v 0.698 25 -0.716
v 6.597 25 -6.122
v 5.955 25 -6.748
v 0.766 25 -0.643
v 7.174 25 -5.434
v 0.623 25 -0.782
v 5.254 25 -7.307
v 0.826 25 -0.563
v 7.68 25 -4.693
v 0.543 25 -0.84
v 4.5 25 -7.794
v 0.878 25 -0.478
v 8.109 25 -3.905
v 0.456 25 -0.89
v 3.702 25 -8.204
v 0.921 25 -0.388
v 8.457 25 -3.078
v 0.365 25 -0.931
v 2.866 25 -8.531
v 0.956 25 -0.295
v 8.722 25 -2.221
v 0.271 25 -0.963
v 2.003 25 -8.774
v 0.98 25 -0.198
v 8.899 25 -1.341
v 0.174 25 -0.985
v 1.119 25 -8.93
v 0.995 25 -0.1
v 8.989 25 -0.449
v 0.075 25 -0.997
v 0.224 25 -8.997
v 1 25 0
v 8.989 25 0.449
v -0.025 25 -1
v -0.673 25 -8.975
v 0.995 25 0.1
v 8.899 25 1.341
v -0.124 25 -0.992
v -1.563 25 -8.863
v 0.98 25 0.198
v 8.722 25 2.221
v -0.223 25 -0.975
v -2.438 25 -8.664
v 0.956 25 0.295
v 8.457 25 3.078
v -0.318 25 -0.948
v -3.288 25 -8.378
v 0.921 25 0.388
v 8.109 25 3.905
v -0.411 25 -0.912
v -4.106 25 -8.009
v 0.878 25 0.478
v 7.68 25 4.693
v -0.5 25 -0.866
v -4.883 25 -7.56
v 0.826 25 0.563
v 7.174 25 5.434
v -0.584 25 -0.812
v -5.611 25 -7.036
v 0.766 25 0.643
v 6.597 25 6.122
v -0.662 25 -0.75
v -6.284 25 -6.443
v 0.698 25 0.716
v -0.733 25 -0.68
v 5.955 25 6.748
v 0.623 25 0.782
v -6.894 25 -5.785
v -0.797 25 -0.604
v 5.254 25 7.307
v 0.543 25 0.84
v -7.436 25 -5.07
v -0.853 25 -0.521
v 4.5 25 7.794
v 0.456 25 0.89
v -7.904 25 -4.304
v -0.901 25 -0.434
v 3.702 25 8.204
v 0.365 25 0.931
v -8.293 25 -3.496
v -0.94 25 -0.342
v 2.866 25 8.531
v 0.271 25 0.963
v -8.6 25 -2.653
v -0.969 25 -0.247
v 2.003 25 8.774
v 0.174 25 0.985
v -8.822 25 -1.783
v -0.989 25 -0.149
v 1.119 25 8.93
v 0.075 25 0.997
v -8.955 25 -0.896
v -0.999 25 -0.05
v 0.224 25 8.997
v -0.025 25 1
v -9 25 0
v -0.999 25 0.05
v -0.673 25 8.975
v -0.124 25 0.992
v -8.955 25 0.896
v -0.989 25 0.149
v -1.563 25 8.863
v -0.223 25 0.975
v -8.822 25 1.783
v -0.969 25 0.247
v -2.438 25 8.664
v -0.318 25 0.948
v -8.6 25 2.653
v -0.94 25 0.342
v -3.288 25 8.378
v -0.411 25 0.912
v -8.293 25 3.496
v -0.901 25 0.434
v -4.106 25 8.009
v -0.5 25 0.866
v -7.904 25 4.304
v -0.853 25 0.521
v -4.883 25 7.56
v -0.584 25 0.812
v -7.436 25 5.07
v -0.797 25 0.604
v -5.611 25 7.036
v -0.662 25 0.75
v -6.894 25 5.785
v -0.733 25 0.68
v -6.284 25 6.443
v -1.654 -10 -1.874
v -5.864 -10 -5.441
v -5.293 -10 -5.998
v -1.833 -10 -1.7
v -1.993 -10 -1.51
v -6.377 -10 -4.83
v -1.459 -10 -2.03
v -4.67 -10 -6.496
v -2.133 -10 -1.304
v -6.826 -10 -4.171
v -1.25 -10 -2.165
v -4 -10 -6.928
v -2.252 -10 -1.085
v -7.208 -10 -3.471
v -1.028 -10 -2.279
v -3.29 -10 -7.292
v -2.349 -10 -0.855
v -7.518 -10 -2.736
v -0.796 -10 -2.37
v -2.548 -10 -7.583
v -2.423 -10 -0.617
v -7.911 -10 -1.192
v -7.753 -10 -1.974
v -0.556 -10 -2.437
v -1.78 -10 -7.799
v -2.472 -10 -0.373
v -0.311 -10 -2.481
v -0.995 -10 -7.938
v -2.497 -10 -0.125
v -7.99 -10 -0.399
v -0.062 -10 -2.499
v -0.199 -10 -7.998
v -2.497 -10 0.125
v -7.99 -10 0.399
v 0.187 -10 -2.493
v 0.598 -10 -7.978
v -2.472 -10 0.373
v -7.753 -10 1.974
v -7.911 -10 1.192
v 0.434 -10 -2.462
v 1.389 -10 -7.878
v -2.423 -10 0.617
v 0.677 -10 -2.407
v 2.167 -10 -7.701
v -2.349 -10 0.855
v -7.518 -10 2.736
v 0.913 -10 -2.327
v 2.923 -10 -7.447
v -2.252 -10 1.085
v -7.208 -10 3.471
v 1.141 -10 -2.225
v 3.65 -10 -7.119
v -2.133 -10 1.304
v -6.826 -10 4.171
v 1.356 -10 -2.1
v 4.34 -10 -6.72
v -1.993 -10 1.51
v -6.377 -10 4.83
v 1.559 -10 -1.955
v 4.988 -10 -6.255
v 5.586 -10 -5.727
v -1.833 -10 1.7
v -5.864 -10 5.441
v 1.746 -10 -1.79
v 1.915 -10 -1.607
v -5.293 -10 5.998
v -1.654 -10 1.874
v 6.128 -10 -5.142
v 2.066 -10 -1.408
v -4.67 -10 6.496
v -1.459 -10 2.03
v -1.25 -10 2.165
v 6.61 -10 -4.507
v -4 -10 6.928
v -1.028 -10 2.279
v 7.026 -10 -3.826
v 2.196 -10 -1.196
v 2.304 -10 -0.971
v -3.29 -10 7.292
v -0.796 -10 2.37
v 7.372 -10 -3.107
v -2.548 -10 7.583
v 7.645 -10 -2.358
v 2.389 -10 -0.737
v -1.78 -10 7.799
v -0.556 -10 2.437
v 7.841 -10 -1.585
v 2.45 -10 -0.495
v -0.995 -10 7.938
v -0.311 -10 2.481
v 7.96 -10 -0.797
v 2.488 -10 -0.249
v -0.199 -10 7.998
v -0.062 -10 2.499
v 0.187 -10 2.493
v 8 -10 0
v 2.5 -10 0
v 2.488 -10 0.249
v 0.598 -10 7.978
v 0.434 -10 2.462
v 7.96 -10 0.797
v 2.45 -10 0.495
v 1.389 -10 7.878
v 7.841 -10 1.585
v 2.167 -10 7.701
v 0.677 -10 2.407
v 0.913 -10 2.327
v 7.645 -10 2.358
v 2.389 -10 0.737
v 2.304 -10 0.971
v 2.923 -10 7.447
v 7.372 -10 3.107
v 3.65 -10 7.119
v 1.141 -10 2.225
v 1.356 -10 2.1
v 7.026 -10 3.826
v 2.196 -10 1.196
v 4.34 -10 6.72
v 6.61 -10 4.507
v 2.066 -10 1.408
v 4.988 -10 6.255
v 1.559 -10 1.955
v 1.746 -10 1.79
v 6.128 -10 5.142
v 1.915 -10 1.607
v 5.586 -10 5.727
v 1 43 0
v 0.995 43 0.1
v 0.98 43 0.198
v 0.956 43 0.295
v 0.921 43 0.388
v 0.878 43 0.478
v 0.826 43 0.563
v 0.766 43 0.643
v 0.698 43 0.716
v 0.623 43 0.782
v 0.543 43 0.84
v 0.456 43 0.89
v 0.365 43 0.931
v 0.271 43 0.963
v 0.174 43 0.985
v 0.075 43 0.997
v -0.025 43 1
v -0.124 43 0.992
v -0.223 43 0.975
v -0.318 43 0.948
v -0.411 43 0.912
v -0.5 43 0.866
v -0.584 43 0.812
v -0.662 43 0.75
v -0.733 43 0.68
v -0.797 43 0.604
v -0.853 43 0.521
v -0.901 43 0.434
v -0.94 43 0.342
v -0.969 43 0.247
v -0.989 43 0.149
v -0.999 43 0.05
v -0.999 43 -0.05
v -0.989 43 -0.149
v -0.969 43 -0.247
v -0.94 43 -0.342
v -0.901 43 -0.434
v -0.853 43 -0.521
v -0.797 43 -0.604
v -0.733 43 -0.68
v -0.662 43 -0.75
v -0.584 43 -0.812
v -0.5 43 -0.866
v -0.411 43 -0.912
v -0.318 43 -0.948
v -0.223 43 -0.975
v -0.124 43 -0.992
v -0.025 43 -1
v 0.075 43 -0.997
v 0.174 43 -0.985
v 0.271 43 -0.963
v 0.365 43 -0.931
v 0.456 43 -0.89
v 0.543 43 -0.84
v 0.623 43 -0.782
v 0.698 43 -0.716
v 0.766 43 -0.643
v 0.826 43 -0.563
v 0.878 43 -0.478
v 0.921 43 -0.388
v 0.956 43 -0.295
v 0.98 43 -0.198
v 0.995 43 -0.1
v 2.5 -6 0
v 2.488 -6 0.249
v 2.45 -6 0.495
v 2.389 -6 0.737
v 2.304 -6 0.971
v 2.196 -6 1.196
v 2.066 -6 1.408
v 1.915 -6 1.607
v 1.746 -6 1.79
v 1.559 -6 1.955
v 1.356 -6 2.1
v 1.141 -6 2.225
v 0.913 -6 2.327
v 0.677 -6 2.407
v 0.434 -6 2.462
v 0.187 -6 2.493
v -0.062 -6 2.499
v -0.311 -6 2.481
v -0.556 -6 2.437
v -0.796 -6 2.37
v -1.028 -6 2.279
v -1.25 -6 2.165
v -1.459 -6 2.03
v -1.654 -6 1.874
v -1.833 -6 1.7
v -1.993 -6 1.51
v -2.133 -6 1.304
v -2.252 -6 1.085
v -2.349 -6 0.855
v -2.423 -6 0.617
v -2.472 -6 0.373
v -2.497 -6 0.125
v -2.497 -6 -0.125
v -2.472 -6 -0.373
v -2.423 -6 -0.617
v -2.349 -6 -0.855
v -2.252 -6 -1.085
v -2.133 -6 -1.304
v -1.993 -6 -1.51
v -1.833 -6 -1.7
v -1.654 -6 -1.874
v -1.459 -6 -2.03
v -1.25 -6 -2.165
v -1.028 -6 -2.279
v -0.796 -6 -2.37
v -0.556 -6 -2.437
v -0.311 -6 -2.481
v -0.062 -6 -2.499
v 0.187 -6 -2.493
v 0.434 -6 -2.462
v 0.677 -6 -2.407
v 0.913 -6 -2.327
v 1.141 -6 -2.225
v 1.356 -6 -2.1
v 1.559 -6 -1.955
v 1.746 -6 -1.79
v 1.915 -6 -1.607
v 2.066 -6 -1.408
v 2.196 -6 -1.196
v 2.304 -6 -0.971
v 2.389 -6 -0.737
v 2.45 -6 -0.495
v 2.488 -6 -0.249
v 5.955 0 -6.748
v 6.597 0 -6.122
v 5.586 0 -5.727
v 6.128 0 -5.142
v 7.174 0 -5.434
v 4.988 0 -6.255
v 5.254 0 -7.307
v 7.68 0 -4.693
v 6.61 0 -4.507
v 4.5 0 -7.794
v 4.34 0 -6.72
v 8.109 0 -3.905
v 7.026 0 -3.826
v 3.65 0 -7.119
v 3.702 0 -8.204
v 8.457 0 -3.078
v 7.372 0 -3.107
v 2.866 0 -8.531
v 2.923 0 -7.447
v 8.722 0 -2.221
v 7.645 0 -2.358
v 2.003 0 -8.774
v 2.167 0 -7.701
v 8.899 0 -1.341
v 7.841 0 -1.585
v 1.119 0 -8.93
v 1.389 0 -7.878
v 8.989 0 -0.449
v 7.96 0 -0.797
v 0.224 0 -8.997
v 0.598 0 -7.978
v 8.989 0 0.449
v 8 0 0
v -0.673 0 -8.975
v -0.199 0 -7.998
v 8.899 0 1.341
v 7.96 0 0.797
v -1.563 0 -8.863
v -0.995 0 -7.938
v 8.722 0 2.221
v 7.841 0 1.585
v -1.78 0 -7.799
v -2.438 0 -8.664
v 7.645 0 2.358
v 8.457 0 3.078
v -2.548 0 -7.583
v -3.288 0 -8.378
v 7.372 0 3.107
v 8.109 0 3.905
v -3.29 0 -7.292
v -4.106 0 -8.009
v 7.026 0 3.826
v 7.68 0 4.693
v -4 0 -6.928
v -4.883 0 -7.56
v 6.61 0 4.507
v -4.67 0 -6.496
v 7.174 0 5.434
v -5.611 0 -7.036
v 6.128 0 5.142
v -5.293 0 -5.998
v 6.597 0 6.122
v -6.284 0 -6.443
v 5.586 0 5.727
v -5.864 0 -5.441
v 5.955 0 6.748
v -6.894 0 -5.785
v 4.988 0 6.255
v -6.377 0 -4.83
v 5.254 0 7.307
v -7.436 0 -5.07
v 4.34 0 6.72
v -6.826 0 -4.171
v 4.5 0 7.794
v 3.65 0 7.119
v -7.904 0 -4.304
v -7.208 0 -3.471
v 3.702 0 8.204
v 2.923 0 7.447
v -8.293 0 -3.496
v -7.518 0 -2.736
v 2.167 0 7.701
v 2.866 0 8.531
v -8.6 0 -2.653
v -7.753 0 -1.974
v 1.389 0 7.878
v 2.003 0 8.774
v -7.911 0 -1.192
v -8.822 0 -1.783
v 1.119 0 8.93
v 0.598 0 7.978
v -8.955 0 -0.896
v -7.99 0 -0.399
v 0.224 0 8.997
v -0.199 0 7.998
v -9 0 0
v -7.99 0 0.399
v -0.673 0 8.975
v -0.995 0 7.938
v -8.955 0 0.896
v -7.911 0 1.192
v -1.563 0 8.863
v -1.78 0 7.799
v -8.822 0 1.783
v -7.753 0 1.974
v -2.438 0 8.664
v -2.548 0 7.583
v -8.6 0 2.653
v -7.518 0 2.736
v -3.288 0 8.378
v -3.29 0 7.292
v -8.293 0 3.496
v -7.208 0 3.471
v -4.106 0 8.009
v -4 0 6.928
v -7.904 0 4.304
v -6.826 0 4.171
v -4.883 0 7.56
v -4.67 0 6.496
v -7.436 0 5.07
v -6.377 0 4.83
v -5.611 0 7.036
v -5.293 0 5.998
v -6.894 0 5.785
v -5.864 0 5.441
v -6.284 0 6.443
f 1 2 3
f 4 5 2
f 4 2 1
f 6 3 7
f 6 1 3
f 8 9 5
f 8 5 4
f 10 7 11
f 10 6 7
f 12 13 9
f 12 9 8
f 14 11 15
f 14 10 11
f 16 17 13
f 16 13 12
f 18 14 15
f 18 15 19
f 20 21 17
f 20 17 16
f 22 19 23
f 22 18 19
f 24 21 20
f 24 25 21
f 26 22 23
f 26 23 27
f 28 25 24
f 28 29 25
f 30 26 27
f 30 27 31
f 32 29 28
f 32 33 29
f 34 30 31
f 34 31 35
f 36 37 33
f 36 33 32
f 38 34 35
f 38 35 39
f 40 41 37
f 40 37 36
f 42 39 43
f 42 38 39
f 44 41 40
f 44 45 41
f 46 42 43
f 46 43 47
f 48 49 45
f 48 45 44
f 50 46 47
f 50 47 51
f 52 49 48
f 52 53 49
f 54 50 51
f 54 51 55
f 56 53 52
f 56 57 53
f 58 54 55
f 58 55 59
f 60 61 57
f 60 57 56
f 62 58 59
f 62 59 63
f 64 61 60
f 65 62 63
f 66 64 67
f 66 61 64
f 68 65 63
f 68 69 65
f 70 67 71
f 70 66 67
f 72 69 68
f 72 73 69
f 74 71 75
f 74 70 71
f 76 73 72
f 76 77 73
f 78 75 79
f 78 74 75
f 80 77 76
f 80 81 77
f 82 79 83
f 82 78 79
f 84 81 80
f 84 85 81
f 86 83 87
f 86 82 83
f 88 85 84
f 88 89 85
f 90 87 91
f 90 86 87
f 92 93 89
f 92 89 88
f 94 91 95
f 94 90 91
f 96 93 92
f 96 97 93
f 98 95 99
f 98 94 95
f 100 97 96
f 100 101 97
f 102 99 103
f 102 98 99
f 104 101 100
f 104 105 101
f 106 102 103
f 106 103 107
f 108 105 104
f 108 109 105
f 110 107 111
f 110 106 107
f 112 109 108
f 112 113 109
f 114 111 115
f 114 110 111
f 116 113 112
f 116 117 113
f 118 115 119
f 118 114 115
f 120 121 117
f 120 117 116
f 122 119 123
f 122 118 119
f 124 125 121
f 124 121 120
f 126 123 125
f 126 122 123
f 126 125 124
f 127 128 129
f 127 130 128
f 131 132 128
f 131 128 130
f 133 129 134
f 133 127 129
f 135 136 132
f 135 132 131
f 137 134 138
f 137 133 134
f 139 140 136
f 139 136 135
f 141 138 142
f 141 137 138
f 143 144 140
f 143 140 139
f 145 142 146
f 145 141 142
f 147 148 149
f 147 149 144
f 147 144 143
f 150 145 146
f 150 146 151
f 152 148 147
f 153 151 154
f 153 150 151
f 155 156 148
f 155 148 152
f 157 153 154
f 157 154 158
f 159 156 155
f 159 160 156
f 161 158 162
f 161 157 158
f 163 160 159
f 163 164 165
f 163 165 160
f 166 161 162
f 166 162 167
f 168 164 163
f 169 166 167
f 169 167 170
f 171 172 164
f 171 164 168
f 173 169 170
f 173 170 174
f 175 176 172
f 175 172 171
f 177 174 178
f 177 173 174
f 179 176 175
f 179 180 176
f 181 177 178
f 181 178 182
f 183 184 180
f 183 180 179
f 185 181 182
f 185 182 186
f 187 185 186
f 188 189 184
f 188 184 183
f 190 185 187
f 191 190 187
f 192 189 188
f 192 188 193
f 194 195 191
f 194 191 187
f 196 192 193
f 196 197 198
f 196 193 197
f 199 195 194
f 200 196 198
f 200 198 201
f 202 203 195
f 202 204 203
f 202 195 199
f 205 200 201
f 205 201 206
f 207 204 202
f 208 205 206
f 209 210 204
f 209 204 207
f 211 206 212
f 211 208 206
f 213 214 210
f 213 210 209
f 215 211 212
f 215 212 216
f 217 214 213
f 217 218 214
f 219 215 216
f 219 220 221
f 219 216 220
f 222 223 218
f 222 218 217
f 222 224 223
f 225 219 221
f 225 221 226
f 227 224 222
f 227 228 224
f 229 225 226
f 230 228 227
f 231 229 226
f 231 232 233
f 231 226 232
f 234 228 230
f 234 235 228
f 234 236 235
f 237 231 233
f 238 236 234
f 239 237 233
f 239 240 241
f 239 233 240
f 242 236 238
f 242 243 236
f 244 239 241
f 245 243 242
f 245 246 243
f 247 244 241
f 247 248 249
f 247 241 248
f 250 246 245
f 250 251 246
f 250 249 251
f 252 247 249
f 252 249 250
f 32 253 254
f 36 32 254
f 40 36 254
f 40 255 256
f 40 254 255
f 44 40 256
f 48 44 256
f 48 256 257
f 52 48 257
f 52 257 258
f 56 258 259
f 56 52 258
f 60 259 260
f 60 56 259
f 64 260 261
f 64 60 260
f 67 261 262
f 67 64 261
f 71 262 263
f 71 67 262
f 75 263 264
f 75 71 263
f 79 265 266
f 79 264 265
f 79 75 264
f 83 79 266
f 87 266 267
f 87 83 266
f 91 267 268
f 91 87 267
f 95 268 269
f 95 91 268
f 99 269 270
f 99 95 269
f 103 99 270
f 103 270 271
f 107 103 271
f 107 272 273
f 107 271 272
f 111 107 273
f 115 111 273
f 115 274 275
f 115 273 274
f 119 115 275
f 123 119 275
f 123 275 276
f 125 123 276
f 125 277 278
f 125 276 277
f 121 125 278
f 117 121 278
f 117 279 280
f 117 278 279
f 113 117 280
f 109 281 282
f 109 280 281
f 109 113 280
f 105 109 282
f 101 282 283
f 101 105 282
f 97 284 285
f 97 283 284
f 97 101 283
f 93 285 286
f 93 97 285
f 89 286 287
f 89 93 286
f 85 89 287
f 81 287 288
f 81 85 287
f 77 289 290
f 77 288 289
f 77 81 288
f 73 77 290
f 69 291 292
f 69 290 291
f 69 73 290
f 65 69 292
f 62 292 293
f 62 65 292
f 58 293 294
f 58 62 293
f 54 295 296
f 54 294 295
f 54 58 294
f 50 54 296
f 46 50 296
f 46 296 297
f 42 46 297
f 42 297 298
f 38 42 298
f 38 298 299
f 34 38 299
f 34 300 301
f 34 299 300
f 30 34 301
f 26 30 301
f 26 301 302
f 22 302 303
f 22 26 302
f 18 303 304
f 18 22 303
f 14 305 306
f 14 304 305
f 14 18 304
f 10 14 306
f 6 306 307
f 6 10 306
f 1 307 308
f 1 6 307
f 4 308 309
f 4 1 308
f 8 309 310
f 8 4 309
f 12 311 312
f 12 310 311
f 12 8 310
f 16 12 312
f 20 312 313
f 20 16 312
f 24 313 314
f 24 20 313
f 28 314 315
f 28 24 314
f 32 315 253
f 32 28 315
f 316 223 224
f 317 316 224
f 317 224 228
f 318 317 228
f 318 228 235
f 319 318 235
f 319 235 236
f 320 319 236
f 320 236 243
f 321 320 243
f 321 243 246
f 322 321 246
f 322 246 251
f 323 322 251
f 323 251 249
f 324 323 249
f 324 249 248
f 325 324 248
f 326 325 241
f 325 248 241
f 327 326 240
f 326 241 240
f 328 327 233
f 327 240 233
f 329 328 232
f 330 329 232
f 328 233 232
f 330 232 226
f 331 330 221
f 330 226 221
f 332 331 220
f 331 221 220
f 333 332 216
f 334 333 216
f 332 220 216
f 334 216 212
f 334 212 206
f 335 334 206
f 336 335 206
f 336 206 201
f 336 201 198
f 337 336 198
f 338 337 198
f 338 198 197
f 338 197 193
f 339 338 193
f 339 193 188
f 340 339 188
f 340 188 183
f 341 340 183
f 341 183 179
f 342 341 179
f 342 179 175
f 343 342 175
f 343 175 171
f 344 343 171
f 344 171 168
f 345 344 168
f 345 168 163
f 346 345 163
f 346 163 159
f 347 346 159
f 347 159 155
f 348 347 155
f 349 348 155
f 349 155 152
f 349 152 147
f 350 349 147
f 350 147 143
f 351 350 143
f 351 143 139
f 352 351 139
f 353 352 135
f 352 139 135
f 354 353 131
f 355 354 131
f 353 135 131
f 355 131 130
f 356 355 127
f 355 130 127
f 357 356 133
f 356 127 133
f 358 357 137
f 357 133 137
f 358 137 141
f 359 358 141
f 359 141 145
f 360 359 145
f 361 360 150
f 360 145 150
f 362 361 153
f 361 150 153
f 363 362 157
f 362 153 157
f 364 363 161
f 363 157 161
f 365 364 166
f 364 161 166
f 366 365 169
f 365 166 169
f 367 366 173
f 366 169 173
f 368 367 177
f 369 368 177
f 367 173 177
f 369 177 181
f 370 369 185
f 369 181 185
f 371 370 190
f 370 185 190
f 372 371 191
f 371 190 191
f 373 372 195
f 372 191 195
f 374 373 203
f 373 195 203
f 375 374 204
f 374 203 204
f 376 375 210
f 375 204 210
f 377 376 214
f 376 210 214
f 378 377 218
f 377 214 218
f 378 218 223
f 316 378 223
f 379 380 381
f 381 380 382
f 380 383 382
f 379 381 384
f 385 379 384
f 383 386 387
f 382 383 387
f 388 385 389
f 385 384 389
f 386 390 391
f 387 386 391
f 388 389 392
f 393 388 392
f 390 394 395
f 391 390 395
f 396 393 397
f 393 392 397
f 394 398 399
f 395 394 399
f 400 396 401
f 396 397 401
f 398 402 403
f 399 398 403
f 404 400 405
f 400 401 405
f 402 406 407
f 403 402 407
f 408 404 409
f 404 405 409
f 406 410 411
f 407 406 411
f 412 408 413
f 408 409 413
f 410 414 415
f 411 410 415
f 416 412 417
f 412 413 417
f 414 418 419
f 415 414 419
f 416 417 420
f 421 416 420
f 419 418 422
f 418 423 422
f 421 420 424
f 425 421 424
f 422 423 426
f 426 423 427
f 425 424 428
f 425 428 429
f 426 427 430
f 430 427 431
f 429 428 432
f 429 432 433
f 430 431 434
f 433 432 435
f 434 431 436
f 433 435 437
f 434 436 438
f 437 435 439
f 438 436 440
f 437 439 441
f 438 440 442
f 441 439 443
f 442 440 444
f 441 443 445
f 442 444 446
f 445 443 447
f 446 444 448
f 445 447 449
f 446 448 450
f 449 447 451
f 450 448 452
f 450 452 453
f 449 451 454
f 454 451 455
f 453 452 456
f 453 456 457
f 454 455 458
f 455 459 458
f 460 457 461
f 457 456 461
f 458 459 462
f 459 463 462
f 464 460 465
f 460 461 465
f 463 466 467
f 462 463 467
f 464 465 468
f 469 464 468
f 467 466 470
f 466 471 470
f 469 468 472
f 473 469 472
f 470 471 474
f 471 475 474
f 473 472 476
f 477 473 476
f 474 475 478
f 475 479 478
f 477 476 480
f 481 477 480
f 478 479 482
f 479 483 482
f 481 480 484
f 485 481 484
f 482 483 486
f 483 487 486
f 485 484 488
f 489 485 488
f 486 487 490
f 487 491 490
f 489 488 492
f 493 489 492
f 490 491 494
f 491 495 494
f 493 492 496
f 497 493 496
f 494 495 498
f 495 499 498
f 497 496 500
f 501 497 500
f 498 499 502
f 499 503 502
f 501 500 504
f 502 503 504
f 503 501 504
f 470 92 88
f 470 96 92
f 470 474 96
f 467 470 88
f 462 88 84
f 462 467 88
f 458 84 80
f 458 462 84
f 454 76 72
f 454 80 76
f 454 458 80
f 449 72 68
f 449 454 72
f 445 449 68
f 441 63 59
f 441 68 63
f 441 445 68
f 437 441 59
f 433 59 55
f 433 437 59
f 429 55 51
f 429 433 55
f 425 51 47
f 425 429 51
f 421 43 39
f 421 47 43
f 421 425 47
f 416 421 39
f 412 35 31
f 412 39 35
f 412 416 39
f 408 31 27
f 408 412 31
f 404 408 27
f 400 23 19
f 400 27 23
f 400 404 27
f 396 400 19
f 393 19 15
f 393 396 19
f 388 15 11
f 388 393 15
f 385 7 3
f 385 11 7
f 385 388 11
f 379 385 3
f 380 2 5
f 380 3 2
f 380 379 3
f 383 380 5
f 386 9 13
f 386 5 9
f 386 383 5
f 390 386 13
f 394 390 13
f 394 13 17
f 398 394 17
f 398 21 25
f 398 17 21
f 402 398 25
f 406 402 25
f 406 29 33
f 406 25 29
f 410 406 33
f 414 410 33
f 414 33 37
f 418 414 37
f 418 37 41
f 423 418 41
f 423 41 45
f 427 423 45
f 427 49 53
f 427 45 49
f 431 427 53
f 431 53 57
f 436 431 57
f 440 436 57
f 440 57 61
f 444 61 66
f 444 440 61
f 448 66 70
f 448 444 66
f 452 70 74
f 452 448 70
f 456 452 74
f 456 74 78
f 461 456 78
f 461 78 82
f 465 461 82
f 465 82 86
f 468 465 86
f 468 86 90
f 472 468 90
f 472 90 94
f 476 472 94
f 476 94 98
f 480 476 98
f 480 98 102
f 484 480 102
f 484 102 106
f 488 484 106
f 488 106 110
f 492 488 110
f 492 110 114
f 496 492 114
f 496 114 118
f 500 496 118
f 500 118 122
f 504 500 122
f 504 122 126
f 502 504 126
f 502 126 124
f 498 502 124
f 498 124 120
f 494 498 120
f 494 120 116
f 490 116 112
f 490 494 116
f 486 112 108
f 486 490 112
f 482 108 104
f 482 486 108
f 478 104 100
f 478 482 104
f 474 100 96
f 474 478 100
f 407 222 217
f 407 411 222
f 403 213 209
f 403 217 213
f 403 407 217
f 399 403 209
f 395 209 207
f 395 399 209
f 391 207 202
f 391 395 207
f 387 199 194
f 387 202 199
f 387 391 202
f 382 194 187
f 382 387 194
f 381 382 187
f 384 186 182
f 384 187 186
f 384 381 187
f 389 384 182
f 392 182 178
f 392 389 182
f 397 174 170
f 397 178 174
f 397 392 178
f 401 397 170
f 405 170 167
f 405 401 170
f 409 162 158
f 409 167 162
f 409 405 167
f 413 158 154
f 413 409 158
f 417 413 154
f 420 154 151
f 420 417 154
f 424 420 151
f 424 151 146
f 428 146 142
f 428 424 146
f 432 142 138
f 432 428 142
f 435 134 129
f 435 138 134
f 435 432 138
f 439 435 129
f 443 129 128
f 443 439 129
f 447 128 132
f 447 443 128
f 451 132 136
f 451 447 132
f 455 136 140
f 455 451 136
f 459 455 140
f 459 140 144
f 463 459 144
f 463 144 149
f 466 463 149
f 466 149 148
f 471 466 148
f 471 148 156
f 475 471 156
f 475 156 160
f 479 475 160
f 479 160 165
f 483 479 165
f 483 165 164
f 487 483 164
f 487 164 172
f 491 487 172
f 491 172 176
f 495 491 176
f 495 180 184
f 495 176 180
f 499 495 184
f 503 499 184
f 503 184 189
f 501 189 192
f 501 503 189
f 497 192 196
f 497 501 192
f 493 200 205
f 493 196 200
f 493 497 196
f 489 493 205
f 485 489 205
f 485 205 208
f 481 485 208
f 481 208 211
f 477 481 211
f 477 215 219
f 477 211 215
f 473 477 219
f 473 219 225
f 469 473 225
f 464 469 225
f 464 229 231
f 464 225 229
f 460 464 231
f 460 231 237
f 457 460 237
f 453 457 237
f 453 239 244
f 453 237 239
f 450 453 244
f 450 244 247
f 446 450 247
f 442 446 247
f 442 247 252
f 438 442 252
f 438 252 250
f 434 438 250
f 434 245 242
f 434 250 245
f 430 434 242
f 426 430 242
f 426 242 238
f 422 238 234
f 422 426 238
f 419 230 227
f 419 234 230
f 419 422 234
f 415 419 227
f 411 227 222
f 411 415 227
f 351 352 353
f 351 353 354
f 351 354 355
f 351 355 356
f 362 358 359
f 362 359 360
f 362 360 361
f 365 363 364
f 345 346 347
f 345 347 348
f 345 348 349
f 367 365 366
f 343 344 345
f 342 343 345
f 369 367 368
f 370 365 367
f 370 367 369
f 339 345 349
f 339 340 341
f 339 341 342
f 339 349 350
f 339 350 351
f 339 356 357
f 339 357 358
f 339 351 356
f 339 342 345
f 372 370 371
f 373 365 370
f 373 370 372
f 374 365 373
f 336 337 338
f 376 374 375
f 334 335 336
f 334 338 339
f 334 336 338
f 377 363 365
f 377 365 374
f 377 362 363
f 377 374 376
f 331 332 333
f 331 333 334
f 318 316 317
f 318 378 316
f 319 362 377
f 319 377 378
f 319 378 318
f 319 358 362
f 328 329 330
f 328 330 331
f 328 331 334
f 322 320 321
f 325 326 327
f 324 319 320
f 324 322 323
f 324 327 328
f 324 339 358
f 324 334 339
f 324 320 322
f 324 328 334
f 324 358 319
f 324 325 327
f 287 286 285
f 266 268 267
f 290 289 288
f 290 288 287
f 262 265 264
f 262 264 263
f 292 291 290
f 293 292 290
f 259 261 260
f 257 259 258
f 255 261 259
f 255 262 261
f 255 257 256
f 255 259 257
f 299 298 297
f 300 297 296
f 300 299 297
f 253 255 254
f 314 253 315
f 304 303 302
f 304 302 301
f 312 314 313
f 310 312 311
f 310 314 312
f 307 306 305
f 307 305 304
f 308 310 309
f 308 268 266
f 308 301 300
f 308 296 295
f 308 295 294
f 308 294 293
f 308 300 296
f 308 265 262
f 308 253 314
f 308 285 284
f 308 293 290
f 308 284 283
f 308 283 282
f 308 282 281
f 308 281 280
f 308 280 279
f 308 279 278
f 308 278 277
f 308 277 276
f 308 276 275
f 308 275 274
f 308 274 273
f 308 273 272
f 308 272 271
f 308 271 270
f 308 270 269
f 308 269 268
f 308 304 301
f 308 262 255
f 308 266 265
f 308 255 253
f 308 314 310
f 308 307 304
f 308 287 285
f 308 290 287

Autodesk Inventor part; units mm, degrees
ref_plane "YZ Plane" through (0, 0, 0) normal (1, 0, 0) x (0, 1, 0)
ref_plane "XZ Plane" through (0, 0, 0) normal (0, 1, 0) x (-1, 0, 0)
ref_plane "XY Plane" through (0, 0, 0) normal (0, 0, 1) x (1, 0, 0)
sketch "Sketch1" plane through (0, 0, 0) normal (0, 1, 0) x (-1, 0, 0)
  circle A0 centre (0, 0) radius 10
  circle A1 centre (0, 0) radius 9
  dimension "d0" = 20
  dimension "d1" = 18
extrude "Extrusion1" add sketch "Sketch1" along normal blind 25 contours A1
sketch "Sketch2" plane through (0, 0, 0) normal (0, -1, 0) x (1, 0, 0)
  circle A0 centre (0, 0) radius 8
  dimension "d4" = 16
extrude "Extrusion2" add sketch "Sketch2" along normal blind 10
sketch "Sketch3" plane through (0, -10, 0) normal (0, -1, 0) x (1, 0, 0)
  circle A0 centre (0, 0) radius 2.5
  dimension "d7" = 5
extrude "Extrusion3" cut sketch "Sketch3" against normal blind 4
sketch "Sketch4" plane through (0, 25, 0) normal (0, 1, 0) x (1, 0, 0)
  circle A0 centre (0, 0) radius 1
  dimension "d10" = 2
extrude "Extrusion4" add sketch "Sketch4" along normal blind 18
sketch "Sketch5" plane through (0, -6, 0) normal (0, -1, 0) x (1, 0, 0)
  point P0 (0, 0)
properties part number "pump"
